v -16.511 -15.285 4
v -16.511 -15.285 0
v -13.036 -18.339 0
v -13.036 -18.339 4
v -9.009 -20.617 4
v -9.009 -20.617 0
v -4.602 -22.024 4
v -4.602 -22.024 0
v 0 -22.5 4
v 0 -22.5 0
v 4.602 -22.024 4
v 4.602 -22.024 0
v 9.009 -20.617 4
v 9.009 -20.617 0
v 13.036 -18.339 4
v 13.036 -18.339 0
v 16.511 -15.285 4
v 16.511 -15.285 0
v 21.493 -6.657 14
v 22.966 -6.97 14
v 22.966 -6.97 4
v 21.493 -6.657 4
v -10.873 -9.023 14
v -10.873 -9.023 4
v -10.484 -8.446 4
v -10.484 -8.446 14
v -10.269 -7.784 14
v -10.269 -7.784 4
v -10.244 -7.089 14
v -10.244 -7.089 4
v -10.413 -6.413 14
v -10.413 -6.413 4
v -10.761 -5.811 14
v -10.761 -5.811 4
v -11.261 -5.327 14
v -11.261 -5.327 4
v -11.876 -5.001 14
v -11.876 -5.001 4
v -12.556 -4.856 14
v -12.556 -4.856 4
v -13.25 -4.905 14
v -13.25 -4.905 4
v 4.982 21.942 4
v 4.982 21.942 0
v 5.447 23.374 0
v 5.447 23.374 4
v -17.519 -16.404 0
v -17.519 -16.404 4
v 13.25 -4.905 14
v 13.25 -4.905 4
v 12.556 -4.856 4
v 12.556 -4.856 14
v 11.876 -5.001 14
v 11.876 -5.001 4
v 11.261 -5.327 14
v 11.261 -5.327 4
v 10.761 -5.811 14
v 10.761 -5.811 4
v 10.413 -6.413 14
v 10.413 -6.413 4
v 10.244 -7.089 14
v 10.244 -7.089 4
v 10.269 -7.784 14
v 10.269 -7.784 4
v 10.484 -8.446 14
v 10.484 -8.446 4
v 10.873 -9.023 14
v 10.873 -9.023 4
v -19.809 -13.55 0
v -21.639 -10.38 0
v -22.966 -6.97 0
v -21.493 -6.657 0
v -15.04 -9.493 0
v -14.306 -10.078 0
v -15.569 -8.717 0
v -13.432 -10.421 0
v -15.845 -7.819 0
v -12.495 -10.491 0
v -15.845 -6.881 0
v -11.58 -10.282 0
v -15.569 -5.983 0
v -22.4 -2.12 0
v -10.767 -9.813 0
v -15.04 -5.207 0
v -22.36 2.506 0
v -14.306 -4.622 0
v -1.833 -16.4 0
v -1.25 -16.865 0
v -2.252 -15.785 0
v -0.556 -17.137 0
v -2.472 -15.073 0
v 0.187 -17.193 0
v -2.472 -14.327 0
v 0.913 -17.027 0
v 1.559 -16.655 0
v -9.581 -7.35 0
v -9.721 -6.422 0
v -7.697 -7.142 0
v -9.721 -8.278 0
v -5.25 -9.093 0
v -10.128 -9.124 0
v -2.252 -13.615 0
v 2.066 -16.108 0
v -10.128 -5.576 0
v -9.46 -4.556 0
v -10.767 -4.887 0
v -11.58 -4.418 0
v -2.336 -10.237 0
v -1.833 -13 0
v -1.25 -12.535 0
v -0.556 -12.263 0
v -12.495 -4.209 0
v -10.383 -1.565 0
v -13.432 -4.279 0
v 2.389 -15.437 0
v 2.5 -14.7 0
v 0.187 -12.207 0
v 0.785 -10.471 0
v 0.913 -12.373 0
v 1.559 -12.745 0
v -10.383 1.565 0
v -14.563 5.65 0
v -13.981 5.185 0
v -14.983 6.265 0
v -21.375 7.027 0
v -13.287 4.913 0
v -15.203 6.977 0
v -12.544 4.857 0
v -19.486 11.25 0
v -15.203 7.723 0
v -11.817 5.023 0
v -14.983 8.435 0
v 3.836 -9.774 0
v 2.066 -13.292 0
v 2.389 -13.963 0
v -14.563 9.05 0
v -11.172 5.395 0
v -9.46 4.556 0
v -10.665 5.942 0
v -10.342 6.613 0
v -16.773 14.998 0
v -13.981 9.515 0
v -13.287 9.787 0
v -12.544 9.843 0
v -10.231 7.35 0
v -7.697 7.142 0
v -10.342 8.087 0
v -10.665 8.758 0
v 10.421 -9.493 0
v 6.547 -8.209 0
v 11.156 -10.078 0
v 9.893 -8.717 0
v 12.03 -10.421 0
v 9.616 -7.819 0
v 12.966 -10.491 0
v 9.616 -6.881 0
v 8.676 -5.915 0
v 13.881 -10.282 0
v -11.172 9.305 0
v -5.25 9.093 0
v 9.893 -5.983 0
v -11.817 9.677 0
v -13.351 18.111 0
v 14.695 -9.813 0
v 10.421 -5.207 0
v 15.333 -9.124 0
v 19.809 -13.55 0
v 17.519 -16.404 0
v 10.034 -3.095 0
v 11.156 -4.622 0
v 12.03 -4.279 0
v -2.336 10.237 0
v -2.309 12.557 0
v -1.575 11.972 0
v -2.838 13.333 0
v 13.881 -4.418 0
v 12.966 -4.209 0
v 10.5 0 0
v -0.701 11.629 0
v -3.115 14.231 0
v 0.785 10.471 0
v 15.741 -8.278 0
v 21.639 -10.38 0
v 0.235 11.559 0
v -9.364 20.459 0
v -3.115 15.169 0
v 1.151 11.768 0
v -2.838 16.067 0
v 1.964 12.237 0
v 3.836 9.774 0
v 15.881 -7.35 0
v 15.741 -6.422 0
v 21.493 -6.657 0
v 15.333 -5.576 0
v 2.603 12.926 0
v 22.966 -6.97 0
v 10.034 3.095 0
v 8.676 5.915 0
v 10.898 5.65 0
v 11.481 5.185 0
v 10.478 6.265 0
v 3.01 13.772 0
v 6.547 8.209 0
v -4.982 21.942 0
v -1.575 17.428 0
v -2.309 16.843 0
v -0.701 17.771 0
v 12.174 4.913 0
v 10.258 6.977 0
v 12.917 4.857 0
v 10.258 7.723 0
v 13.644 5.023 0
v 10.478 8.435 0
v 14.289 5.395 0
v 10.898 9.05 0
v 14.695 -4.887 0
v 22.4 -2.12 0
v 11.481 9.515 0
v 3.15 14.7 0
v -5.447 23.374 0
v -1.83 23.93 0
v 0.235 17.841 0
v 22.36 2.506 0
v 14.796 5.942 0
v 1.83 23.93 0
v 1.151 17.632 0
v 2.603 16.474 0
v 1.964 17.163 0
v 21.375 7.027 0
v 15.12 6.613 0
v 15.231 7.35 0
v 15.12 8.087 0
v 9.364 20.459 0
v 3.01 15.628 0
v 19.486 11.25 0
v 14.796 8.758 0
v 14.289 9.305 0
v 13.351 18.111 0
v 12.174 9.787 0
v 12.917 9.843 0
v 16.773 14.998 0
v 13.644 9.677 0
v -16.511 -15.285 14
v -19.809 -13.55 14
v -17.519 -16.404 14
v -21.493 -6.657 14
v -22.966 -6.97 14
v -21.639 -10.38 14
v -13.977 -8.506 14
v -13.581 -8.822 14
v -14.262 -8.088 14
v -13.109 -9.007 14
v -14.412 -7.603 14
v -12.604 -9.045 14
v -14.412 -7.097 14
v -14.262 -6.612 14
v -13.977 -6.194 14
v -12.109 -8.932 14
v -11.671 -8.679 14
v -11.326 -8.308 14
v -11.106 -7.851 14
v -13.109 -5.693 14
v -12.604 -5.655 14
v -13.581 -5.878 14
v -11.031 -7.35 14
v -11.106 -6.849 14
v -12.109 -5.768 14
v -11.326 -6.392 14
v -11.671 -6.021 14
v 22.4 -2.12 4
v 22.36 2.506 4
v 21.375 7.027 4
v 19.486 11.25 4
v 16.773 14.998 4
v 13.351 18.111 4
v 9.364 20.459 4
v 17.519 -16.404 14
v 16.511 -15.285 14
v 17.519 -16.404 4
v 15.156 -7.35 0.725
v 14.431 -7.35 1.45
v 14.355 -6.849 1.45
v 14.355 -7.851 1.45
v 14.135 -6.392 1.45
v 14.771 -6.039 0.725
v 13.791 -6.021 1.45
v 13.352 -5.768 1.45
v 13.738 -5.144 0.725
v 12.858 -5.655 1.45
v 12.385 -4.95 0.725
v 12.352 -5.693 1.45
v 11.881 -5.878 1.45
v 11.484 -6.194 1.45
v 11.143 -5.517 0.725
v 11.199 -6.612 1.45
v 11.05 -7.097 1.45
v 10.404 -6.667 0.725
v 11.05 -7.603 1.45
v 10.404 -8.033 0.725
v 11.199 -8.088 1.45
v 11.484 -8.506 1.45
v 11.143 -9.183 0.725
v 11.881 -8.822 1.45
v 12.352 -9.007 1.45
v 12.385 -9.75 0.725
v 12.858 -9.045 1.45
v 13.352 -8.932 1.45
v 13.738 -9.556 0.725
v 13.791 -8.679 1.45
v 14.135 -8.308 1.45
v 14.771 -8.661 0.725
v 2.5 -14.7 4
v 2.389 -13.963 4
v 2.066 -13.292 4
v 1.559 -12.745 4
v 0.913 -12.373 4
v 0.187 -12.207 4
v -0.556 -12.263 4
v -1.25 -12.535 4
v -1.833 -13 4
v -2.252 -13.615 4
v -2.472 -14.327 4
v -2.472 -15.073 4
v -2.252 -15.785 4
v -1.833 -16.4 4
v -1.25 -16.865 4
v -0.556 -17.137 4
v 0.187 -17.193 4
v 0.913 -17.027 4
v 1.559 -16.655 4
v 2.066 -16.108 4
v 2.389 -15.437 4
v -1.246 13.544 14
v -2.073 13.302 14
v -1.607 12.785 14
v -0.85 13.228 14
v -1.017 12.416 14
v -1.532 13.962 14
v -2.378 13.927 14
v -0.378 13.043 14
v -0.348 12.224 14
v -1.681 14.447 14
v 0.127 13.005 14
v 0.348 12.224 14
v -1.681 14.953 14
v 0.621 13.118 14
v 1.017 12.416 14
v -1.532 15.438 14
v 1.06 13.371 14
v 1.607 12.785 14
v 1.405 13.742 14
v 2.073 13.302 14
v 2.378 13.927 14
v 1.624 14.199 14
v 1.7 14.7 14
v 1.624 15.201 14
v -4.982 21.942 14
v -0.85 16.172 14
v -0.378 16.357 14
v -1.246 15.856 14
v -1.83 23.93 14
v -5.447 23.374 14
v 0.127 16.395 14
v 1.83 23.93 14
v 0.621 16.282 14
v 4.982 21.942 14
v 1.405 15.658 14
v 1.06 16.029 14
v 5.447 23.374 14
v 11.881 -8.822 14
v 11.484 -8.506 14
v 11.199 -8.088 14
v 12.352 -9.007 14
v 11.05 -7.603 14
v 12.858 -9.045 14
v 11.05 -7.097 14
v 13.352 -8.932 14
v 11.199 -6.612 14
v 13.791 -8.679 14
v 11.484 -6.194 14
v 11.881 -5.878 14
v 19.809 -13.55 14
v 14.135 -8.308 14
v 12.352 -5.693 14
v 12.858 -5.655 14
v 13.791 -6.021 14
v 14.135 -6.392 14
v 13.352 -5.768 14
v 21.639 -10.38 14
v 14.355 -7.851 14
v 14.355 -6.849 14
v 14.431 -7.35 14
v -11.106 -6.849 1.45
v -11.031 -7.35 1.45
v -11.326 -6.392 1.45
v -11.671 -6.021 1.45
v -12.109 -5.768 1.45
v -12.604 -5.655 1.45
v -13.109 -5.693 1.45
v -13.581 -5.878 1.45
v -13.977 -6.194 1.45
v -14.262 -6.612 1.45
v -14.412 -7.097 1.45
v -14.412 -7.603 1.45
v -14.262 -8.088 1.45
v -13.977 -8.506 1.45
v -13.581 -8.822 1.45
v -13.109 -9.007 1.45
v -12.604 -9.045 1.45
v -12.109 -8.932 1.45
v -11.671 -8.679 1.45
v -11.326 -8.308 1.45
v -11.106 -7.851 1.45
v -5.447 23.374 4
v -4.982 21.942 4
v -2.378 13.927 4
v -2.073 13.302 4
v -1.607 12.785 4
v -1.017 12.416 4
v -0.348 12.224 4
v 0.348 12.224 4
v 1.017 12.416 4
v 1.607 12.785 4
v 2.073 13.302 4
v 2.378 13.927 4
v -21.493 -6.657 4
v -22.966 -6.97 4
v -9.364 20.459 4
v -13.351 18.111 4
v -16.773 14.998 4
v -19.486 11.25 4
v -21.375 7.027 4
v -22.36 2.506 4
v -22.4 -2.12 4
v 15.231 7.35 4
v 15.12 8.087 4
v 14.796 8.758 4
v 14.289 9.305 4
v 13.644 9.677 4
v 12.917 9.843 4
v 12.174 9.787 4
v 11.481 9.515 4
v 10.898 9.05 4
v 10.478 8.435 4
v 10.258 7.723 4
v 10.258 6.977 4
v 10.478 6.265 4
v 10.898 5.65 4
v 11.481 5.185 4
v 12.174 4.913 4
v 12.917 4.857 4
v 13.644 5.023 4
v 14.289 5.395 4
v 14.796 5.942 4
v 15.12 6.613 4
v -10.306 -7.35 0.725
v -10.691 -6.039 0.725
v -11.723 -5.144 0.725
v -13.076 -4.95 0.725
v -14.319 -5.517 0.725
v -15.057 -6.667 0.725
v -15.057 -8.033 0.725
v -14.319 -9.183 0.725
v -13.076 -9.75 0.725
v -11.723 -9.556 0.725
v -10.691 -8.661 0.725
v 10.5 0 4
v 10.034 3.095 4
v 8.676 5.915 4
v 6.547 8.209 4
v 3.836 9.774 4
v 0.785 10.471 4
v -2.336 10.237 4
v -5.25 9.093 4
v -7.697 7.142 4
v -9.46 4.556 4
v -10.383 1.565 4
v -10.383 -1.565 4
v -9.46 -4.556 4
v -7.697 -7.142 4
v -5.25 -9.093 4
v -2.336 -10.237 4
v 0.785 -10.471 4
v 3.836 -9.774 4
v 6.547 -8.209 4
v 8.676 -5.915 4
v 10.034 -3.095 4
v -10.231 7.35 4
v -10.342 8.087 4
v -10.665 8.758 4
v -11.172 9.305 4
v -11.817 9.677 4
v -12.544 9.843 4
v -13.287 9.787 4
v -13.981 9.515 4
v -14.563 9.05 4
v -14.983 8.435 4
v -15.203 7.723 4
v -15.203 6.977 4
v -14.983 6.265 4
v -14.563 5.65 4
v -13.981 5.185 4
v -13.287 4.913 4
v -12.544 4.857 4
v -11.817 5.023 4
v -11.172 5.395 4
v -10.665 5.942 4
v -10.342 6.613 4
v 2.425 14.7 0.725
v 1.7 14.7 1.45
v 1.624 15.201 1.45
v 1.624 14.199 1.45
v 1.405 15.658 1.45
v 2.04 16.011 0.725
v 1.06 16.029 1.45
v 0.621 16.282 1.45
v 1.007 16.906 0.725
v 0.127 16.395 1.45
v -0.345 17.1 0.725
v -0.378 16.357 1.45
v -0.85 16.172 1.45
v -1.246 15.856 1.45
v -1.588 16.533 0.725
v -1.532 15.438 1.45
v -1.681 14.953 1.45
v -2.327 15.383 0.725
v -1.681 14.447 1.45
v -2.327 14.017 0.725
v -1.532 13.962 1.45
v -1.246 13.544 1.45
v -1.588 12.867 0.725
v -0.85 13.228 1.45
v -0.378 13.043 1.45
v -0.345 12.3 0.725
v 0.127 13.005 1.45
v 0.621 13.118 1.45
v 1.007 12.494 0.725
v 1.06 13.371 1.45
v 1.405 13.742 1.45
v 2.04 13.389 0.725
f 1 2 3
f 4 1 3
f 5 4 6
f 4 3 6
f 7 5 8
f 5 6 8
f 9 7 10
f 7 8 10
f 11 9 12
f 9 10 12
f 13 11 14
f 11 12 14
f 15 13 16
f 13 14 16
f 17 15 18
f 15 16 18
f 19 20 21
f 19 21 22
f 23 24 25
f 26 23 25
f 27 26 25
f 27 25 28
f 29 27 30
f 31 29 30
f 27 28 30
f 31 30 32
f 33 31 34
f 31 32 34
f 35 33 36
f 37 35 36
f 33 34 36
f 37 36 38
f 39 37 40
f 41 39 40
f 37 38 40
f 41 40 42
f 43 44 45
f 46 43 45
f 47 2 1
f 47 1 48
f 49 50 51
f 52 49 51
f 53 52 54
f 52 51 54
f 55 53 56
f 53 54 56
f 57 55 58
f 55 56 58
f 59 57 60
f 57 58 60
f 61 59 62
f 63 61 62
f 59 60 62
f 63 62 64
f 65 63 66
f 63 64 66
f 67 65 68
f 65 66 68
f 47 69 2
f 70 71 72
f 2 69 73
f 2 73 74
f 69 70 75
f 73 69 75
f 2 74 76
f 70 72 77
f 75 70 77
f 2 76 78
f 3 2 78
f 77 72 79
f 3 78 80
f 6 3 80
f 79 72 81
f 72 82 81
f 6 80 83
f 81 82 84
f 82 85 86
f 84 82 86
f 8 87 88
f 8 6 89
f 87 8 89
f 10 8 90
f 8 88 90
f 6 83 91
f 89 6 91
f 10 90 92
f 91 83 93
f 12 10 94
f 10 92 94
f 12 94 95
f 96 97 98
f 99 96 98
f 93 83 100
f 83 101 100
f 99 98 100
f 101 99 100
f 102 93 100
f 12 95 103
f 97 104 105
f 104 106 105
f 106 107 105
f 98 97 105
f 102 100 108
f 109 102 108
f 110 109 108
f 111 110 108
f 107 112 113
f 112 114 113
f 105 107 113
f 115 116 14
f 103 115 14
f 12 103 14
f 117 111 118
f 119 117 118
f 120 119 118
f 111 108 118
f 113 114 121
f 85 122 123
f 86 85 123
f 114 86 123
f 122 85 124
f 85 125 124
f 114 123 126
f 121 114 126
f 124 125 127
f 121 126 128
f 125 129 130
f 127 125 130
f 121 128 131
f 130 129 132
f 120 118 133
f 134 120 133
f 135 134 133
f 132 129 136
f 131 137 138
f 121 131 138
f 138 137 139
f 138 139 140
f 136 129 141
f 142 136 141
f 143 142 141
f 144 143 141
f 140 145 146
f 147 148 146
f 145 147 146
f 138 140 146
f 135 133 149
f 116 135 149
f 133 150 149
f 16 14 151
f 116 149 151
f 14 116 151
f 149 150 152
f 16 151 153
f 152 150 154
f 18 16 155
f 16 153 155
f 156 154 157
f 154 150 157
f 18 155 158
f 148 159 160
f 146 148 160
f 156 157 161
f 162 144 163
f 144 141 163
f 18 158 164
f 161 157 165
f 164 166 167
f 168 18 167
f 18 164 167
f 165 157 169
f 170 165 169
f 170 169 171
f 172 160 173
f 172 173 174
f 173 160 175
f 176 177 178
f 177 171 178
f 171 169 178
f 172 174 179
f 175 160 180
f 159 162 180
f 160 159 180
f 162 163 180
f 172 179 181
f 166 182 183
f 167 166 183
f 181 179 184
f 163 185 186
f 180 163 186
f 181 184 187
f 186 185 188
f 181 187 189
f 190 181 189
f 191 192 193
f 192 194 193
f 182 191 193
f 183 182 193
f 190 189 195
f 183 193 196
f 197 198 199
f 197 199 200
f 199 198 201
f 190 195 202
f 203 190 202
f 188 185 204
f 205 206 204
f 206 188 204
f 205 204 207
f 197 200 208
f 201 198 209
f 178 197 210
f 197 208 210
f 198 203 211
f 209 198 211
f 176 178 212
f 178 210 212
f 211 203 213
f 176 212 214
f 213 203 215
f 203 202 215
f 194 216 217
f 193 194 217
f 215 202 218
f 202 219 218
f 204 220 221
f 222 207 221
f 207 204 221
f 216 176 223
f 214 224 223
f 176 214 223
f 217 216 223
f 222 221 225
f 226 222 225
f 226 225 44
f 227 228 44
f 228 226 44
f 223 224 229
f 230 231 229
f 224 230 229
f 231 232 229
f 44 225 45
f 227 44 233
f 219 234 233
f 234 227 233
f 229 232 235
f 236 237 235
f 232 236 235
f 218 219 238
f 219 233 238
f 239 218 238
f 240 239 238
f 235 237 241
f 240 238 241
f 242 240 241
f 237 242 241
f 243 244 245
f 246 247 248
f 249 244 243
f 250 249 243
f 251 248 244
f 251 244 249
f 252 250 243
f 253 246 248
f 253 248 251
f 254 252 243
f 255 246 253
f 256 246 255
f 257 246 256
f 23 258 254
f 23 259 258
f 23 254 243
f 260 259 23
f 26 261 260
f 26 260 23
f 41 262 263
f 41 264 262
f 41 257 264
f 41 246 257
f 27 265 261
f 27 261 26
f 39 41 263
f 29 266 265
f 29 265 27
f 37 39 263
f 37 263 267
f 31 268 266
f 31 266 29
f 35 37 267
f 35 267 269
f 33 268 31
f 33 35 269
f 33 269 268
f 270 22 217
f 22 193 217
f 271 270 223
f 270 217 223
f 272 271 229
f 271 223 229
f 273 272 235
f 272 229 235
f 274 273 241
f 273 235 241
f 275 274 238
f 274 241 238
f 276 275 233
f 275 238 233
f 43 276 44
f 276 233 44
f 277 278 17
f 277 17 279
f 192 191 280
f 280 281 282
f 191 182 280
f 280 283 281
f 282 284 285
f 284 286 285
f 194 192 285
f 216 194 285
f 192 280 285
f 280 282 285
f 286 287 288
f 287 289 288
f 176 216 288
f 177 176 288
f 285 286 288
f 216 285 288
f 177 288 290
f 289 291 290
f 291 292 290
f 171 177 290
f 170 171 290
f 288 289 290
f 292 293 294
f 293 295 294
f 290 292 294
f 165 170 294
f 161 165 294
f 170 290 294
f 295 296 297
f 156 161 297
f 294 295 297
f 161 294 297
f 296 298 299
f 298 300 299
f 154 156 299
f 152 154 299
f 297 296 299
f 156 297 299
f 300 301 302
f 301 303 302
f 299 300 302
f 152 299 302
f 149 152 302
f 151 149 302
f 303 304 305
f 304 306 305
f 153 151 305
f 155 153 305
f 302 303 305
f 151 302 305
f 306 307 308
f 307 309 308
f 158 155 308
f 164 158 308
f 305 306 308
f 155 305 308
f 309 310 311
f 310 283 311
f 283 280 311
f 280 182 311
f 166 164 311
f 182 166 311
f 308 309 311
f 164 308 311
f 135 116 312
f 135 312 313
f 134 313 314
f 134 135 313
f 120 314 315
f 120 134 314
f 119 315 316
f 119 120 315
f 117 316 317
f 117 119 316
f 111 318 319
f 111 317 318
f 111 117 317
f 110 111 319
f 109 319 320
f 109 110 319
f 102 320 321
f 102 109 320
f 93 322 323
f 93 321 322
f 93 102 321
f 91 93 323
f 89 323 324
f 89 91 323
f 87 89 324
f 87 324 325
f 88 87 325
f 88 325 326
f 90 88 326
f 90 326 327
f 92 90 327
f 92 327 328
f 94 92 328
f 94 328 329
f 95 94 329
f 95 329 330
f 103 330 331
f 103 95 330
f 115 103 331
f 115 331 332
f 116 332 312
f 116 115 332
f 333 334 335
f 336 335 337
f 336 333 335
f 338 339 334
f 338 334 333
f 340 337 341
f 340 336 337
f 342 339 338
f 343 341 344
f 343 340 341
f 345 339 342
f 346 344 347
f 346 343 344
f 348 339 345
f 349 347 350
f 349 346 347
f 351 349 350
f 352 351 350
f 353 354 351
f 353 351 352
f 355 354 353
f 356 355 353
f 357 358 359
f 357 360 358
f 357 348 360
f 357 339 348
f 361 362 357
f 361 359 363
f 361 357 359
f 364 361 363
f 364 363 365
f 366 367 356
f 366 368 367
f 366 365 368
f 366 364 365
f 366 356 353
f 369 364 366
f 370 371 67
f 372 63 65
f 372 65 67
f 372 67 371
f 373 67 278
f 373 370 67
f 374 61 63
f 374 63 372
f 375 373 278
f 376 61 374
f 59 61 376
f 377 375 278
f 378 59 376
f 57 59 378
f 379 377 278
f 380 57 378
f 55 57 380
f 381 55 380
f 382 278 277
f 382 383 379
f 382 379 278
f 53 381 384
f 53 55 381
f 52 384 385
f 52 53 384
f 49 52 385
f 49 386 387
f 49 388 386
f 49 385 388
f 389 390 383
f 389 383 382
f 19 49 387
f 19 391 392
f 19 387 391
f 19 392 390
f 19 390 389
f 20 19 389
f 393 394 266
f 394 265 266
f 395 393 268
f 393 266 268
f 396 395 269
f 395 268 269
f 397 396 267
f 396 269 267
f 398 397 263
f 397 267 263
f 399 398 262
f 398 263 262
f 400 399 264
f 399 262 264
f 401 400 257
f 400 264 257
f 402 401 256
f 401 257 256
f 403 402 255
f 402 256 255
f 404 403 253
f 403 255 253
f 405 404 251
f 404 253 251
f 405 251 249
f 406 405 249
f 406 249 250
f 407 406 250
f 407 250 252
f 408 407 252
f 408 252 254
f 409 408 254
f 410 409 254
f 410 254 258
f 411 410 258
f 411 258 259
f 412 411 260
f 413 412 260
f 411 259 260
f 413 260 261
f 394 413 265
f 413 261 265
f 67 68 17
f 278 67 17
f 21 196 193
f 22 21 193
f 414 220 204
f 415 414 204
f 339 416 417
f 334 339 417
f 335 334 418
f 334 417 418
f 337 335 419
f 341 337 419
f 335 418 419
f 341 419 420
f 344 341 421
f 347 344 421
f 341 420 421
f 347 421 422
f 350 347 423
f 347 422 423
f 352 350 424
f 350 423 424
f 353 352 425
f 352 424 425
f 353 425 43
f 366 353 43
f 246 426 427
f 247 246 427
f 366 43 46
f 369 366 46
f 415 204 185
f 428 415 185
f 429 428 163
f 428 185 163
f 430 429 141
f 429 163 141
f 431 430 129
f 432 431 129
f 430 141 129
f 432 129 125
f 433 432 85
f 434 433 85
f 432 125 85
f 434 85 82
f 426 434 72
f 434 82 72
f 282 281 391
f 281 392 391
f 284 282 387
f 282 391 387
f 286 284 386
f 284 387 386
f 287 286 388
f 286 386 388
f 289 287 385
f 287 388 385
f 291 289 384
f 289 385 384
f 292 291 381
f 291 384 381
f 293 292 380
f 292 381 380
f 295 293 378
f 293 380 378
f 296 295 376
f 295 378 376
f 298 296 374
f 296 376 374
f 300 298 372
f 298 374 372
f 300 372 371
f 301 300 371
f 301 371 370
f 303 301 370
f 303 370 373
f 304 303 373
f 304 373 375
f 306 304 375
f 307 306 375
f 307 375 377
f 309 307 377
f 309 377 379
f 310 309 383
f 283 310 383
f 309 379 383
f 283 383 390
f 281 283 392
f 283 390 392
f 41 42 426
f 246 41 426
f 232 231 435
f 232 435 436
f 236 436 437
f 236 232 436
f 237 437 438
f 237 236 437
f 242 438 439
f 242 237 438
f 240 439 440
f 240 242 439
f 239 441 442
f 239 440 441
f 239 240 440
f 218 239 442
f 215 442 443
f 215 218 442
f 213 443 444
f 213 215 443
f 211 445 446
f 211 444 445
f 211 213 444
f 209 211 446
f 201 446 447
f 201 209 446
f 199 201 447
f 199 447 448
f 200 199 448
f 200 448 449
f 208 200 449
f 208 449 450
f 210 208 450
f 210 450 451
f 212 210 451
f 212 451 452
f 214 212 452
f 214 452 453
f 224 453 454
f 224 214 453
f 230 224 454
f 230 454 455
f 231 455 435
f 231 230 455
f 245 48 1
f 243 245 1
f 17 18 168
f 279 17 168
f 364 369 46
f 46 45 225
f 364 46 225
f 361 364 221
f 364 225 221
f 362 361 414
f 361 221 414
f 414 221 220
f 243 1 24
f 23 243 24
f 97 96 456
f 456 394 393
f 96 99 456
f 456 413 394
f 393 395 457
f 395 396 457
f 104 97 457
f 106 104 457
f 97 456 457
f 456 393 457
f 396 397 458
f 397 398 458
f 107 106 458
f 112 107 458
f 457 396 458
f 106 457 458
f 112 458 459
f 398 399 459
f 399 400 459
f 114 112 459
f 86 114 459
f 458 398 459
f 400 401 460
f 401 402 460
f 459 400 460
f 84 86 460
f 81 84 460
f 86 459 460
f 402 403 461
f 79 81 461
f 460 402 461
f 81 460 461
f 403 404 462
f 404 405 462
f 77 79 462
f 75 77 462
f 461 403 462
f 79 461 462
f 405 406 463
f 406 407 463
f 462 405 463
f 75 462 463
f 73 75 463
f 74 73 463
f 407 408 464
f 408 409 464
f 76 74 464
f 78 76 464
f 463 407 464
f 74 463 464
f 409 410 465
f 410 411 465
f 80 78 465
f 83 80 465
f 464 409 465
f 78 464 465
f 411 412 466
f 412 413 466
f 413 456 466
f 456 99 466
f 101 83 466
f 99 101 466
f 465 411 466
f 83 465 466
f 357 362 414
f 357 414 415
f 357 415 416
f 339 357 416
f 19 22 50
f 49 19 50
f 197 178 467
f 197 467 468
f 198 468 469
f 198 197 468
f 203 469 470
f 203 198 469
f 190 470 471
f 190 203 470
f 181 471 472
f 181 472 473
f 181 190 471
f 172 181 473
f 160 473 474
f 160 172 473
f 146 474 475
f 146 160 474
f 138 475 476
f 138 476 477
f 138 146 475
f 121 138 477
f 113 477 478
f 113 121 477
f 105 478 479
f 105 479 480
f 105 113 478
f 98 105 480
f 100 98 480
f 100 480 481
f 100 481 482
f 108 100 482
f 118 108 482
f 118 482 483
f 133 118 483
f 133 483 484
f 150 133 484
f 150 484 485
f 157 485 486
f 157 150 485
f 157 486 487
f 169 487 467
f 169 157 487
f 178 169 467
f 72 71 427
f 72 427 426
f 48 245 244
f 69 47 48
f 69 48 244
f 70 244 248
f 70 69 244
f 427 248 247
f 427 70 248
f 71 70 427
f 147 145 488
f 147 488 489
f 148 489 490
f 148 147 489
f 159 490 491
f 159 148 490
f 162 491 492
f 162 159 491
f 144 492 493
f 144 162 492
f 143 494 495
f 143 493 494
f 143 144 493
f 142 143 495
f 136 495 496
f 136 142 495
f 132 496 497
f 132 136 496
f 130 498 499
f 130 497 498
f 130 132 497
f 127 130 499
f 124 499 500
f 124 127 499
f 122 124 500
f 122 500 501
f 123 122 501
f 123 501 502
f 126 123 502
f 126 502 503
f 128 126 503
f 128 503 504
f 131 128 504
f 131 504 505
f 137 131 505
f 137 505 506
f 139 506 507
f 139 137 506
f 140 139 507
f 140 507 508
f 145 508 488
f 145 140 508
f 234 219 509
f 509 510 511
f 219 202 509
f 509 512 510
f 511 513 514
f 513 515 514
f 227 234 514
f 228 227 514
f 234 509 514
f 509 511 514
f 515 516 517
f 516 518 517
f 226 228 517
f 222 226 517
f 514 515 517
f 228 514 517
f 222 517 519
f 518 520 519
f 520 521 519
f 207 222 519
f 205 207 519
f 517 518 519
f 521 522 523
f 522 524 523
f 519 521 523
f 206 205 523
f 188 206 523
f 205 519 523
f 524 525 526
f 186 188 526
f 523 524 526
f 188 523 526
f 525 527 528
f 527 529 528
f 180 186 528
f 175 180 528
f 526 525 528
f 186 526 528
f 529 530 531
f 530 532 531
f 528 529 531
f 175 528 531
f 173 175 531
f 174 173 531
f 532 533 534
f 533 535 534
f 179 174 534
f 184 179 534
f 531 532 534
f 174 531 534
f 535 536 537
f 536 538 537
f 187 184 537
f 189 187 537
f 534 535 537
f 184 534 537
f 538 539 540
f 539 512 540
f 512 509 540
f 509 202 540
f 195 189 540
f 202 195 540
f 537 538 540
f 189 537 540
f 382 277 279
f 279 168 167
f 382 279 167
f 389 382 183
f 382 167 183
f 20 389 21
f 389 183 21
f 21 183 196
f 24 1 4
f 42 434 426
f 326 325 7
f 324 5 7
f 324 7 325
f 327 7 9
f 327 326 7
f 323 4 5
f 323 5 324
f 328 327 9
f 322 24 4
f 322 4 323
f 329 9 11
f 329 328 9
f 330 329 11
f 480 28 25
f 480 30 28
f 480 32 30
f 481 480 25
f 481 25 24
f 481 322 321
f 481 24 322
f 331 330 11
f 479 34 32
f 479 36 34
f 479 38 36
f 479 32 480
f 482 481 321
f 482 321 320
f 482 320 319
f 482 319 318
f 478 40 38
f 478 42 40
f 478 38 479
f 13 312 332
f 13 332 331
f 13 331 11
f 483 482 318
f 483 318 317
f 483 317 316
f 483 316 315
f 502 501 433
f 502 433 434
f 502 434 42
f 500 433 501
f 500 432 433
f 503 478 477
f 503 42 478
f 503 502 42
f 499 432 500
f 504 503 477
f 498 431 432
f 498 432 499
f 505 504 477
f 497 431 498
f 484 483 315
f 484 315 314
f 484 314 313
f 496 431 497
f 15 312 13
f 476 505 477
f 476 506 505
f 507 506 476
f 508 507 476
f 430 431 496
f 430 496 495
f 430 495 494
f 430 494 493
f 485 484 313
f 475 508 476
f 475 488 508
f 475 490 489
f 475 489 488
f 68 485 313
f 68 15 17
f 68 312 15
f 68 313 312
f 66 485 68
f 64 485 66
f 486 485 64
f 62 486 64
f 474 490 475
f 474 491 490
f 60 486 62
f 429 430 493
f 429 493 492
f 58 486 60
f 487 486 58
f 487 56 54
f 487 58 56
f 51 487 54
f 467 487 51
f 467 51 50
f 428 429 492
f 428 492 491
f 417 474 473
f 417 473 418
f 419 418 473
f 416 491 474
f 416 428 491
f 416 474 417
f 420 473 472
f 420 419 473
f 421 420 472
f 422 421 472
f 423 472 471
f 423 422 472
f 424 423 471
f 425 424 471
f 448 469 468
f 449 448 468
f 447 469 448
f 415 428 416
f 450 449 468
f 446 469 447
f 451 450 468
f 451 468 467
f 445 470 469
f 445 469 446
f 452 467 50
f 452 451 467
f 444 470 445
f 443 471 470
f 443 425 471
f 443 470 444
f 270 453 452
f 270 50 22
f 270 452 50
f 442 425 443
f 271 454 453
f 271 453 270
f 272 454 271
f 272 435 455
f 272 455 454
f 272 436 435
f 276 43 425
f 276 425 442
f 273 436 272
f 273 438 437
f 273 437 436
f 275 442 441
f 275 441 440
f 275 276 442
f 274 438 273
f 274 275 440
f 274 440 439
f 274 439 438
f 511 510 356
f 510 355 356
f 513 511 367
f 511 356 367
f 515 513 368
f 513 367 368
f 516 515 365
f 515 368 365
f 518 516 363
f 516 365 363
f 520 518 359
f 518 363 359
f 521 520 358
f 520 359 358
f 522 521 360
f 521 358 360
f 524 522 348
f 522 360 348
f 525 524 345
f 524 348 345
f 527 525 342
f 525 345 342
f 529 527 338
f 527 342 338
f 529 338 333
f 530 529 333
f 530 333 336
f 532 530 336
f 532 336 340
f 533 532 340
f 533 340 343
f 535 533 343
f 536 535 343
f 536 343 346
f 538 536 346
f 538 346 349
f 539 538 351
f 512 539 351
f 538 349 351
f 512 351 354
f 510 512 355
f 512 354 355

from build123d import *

# Parameters (mm, degrees)
SKETCH1_R                                       = 22.5
SKETCH1_R_2                                     = 10.5
SKETCH1_R_3                                     = 1.5
BOSS_EXTRUDE1_DEPTH                             = 4
BOSS_EXTRUDE4_START                             = -4
SKETCH4_R                                       = 2.5
SKETCH4_R_2                                     = 1.5
BOSS_EXTRUDE4_DEPTH                             = 4
SKETCH4_5_R                                     = 1.5
BOSS_EXTRUDE5_DEPTH                             = 10
CUT_EXTRUDE1_DEPTH                              = 35.690393407
CUT_EXTRUDE1_DEPTH_BACK                         = 35.690393407
SKETCH4_3_R                                     = 2.5
CSK_FOR_M3_FLAT_HEAD_MACHINE_SCREW1_D           = 3.4
CSK_FOR_M3_FLAT_HEAD_MACHINE_SCREW1_CSINK_D     = 6.3
CSK_FOR_M3_FLAT_HEAD_MACHINE_SCREW1_CSINK_ANGLE = 90


with BuildPart() as part:
    # Sketch1 → Boss-Extrude1 (new body)
    with BuildSketch(Plane.XY):
        Circle(SKETCH1_R)
        Circle(SKETCH1_R_2, mode=Mode.SUBTRACT)
        with Locations((12.730573436, -7.35)):
            Circle(SKETCH1_R_3, mode=Mode.SUBTRACT)
        with Locations((0, 14.7)):
            Circle(SKETCH1_R_3, mode=Mode.SUBTRACT)
        with Locations((-12.730573436, -7.35)):
            Circle(SKETCH1_R_3, mode=Mode.SUBTRACT)
    extrude(amount=BOSS_EXTRUDE1_DEPTH)

    # Sketch4 → Boss-Extrude4 (add)
    # profile 1 of 6: a face of its own
    with BuildSketch(Plane.XY.offset(4).offset(BOSS_EXTRUDE4_START)):
        with Locations((0, -14.7)):
            Circle(SKETCH4_R)
    # profile 2 of 6: a face of its own
    with BuildSketch(Plane.XY.offset(4).offset(BOSS_EXTRUDE4_START)):
        with Locations((-12.730573436, 7.35)):
            Circle(SKETCH4_R)
    # profile 3 of 6: a face of its own
    with BuildSketch(Plane.XY.offset(4).offset(BOSS_EXTRUDE4_START)):
        with Locations((12.730573436, 7.35)):
            Circle(SKETCH4_R)
    # profile 4 of 6: a face of its own
    with BuildSketch(Plane.XY.offset(4).offset(BOSS_EXTRUDE4_START)):
        with BuildLine():
            Line((-10.872711372, -9.022826516), (-17.518780447, -16.404034005))
            ThreePointArc((-17.518780447, -16.404034005), (-20.784609691, -12), (-22.965700397, -6.969691908))
            Line((-22.965700397, -6.969691908), (-13.250352663, -4.904630998))
            ThreePointArc((-13.250352663, -4.904630998), (-10.565509926, -6.1), (-10.872711372, -9.022826516))
        make_face()
        with Locations((-12.730573436, -7.35)):
            Circle(SKETCH4_R_2, mode=Mode.SUBTRACT)
    # profile 5 of 6: a face of its own
    with BuildSketch(Plane.XY.offset(4).offset(BOSS_EXTRUDE4_START)):
        with BuildLine():
            Line((2.377641291, 13.927457514), (5.44691995, 23.373725913))
            ThreePointArc((5.44691995, 23.373725913), (0, 24), (-5.44691995, 23.373725913))
            Line((-5.44691995, 23.373725913), (-2.377641291, 13.927457514))
            ThreePointArc((-2.377641291, 13.927457514), (0, 12.2), (2.377641291, 13.927457514))
        make_face()
        with Locations((0, 14.7)):
            Circle(SKETCH4_R_2, mode=Mode.SUBTRACT)
    # profile 6 of 6: a face of its own
    with BuildSketch(Plane.XY.offset(4).offset(BOSS_EXTRUDE4_START)):
        with BuildLine():
            Line((10.872711372, -9.022826516), (17.518780447, -16.404034005))
            ThreePointArc((17.518780447, -16.404034005), (20.784609691, -12), (22.965700397, -6.969691908))
            Line((22.965700397, -6.969691908), (13.250352663, -4.904630998))
            ThreePointArc((13.250352663, -4.904630998), (10.565509926, -6.1), (10.872711372, -9.022826516))
        make_face()
        with Locations((12.730573436, -7.35)):
            Circle(SKETCH4_R_2, mode=Mode.SUBTRACT)
    extrude(amount=BOSS_EXTRUDE4_DEPTH)

    # Sketch4<5> → Boss-Extrude5 (add)
    # profile 1 of 6: a face of its own
    with BuildSketch(Plane.XY.offset(4)):
        with BuildLine():
            Line((-5.44691995, 23.373725913), (-4.981593415, 21.941598097))
            ThreePointArc((-4.981593415, 21.941598097), (0, 22.5), (4.981593415, 21.941598097))
            Line((4.981593415, 21.941598097), (5.44691995, 23.373725913))
            ThreePointArc((5.44691995, 23.373725913), (0, 24), (-5.44691995, 23.373725913))
        make_face()
    # profile 2 of 6: a face of its own
    with BuildSketch(Plane.XY.offset(4)):
        with BuildLine():
            ThreePointArc((4.981593415, 21.941598097), (0, 22.5), (-4.981593415, 21.941598097))
            Line((-4.981593415, 21.941598097), (-2.377641291, 13.927457514))
            ThreePointArc((-2.377641291, 13.927457514), (0, 12.2), (2.377641291, 13.927457514))
            Line((2.377641291, 13.927457514), (4.981593415, 21.941598097))
        make_face()
        with Locations((0, 14.7)):
            Circle(SKETCH4_5_R, mode=Mode.SUBTRACT)
    # profile 3 of 6: a face of its own
    with BuildSketch(Plane.XY.offset(4)):
        with BuildLine():
            Line((-17.518780447, -16.404034005), (-16.511184644, -15.284985497))
            ThreePointArc((-16.511184644, -15.284985497), (-19.485571585, -11.25), (-21.492778059, -6.6566126))
            Line((-21.492778059, -6.6566126), (-22.965700397, -6.969691908))
            ThreePointArc((-22.965700397, -6.969691908), (-20.784609691, -12), (-17.518780447, -16.404034005))
        make_face()
    # profile 4 of 6: a face of its own
    with BuildSketch(Plane.XY.offset(4)):
        with BuildLine():
            Line((-16.511184644, -15.284985497), (-10.872711372, -9.022826516))
            ThreePointArc((-10.872711372, -9.022826516), (-10.565509926, -6.1), (-13.250352663, -4.904630998))
            Line((-13.250352663, -4.904630998), (-21.492778059, -6.6566126))
            ThreePointArc((-21.492778059, -6.6566126), (-19.485571585, -11.25), (-16.511184644, -15.284985497))
        make_face()
        with Locations((-12.730573436, -7.35)):
            Circle(SKETCH4_5_R, mode=Mode.SUBTRACT)
    # profile 5 of 6: a face of its own
    with BuildSketch(Plane.XY.offset(4)):
        with BuildLine():
            Line((10.872711372, -9.022826516), (16.511184644, -15.284985497))
            ThreePointArc((16.511184644, -15.284985497), (19.485571585, -11.25), (21.492778059, -6.6566126))
            Line((21.492778059, -6.6566126), (13.250352663, -4.904630998))
            ThreePointArc((13.250352663, -4.904630998), (10.565509926, -6.1), (10.872711372, -9.022826516))
        make_face()
        with Locations((12.730573436, -7.35)):
            Circle(SKETCH4_5_R, mode=Mode.SUBTRACT)
    # profile 6 of 6: a face of its own
    with BuildSketch(Plane.XY.offset(4)):
        with BuildLine():
            ThreePointArc((21.492778059, -6.6566126), (19.485571585, -11.25), (16.511184644, -15.284985497))
            Line((16.511184644, -15.284985497), (17.518780447, -16.404034005))
            ThreePointArc((17.518780447, -16.404034005), (20.784609691, -12), (22.965700397, -6.969691908))
            Line((22.965700397, -6.969691908), (21.492778059, -6.6566126))
        make_face()
    extrude(amount=BOSS_EXTRUDE5_DEPTH)

    # Sketch4<3> → Cut-Extrude1 (cut, two sides: drawn at the far end of the back side and taken through both)
    with BuildSketch(Plane.XY.offset(4).offset(-CUT_EXTRUDE1_DEPTH_BACK)):
        with Locations((0, -14.7)):
            Circle(SKETCH4_3_R)
        with Locations((-12.730573436, 7.35)):
            Circle(SKETCH4_3_R)
        with Locations((12.730573436, 7.35)):
            Circle(SKETCH4_3_R)
    extrude(amount=CUT_EXTRUDE1_DEPTH + CUT_EXTRUDE1_DEPTH_BACK, mode=Mode.SUBTRACT)

    # CSK for M3 Flat Head Machine Screw1 (through all)
    with Locations(Plane(origin=(0, 0, 0), x_dir=(-1, 0, 0), z_dir=(0, 0, -1))):
        with Locations((12.730573436, -7.35), (0, 14.7), (-12.730573436, -7.35)):
            CounterSinkHole(CSK_FOR_M3_FLAT_HEAD_MACHINE_SCREW1_D / 2, CSK_FOR_M3_FLAT_HEAD_MACHINE_SCREW1_CSINK_D / 2, counter_sink_angle=CSK_FOR_M3_FLAT_HEAD_MACHINE_SCREW1_CSINK_ANGLE)


solid = part.part
